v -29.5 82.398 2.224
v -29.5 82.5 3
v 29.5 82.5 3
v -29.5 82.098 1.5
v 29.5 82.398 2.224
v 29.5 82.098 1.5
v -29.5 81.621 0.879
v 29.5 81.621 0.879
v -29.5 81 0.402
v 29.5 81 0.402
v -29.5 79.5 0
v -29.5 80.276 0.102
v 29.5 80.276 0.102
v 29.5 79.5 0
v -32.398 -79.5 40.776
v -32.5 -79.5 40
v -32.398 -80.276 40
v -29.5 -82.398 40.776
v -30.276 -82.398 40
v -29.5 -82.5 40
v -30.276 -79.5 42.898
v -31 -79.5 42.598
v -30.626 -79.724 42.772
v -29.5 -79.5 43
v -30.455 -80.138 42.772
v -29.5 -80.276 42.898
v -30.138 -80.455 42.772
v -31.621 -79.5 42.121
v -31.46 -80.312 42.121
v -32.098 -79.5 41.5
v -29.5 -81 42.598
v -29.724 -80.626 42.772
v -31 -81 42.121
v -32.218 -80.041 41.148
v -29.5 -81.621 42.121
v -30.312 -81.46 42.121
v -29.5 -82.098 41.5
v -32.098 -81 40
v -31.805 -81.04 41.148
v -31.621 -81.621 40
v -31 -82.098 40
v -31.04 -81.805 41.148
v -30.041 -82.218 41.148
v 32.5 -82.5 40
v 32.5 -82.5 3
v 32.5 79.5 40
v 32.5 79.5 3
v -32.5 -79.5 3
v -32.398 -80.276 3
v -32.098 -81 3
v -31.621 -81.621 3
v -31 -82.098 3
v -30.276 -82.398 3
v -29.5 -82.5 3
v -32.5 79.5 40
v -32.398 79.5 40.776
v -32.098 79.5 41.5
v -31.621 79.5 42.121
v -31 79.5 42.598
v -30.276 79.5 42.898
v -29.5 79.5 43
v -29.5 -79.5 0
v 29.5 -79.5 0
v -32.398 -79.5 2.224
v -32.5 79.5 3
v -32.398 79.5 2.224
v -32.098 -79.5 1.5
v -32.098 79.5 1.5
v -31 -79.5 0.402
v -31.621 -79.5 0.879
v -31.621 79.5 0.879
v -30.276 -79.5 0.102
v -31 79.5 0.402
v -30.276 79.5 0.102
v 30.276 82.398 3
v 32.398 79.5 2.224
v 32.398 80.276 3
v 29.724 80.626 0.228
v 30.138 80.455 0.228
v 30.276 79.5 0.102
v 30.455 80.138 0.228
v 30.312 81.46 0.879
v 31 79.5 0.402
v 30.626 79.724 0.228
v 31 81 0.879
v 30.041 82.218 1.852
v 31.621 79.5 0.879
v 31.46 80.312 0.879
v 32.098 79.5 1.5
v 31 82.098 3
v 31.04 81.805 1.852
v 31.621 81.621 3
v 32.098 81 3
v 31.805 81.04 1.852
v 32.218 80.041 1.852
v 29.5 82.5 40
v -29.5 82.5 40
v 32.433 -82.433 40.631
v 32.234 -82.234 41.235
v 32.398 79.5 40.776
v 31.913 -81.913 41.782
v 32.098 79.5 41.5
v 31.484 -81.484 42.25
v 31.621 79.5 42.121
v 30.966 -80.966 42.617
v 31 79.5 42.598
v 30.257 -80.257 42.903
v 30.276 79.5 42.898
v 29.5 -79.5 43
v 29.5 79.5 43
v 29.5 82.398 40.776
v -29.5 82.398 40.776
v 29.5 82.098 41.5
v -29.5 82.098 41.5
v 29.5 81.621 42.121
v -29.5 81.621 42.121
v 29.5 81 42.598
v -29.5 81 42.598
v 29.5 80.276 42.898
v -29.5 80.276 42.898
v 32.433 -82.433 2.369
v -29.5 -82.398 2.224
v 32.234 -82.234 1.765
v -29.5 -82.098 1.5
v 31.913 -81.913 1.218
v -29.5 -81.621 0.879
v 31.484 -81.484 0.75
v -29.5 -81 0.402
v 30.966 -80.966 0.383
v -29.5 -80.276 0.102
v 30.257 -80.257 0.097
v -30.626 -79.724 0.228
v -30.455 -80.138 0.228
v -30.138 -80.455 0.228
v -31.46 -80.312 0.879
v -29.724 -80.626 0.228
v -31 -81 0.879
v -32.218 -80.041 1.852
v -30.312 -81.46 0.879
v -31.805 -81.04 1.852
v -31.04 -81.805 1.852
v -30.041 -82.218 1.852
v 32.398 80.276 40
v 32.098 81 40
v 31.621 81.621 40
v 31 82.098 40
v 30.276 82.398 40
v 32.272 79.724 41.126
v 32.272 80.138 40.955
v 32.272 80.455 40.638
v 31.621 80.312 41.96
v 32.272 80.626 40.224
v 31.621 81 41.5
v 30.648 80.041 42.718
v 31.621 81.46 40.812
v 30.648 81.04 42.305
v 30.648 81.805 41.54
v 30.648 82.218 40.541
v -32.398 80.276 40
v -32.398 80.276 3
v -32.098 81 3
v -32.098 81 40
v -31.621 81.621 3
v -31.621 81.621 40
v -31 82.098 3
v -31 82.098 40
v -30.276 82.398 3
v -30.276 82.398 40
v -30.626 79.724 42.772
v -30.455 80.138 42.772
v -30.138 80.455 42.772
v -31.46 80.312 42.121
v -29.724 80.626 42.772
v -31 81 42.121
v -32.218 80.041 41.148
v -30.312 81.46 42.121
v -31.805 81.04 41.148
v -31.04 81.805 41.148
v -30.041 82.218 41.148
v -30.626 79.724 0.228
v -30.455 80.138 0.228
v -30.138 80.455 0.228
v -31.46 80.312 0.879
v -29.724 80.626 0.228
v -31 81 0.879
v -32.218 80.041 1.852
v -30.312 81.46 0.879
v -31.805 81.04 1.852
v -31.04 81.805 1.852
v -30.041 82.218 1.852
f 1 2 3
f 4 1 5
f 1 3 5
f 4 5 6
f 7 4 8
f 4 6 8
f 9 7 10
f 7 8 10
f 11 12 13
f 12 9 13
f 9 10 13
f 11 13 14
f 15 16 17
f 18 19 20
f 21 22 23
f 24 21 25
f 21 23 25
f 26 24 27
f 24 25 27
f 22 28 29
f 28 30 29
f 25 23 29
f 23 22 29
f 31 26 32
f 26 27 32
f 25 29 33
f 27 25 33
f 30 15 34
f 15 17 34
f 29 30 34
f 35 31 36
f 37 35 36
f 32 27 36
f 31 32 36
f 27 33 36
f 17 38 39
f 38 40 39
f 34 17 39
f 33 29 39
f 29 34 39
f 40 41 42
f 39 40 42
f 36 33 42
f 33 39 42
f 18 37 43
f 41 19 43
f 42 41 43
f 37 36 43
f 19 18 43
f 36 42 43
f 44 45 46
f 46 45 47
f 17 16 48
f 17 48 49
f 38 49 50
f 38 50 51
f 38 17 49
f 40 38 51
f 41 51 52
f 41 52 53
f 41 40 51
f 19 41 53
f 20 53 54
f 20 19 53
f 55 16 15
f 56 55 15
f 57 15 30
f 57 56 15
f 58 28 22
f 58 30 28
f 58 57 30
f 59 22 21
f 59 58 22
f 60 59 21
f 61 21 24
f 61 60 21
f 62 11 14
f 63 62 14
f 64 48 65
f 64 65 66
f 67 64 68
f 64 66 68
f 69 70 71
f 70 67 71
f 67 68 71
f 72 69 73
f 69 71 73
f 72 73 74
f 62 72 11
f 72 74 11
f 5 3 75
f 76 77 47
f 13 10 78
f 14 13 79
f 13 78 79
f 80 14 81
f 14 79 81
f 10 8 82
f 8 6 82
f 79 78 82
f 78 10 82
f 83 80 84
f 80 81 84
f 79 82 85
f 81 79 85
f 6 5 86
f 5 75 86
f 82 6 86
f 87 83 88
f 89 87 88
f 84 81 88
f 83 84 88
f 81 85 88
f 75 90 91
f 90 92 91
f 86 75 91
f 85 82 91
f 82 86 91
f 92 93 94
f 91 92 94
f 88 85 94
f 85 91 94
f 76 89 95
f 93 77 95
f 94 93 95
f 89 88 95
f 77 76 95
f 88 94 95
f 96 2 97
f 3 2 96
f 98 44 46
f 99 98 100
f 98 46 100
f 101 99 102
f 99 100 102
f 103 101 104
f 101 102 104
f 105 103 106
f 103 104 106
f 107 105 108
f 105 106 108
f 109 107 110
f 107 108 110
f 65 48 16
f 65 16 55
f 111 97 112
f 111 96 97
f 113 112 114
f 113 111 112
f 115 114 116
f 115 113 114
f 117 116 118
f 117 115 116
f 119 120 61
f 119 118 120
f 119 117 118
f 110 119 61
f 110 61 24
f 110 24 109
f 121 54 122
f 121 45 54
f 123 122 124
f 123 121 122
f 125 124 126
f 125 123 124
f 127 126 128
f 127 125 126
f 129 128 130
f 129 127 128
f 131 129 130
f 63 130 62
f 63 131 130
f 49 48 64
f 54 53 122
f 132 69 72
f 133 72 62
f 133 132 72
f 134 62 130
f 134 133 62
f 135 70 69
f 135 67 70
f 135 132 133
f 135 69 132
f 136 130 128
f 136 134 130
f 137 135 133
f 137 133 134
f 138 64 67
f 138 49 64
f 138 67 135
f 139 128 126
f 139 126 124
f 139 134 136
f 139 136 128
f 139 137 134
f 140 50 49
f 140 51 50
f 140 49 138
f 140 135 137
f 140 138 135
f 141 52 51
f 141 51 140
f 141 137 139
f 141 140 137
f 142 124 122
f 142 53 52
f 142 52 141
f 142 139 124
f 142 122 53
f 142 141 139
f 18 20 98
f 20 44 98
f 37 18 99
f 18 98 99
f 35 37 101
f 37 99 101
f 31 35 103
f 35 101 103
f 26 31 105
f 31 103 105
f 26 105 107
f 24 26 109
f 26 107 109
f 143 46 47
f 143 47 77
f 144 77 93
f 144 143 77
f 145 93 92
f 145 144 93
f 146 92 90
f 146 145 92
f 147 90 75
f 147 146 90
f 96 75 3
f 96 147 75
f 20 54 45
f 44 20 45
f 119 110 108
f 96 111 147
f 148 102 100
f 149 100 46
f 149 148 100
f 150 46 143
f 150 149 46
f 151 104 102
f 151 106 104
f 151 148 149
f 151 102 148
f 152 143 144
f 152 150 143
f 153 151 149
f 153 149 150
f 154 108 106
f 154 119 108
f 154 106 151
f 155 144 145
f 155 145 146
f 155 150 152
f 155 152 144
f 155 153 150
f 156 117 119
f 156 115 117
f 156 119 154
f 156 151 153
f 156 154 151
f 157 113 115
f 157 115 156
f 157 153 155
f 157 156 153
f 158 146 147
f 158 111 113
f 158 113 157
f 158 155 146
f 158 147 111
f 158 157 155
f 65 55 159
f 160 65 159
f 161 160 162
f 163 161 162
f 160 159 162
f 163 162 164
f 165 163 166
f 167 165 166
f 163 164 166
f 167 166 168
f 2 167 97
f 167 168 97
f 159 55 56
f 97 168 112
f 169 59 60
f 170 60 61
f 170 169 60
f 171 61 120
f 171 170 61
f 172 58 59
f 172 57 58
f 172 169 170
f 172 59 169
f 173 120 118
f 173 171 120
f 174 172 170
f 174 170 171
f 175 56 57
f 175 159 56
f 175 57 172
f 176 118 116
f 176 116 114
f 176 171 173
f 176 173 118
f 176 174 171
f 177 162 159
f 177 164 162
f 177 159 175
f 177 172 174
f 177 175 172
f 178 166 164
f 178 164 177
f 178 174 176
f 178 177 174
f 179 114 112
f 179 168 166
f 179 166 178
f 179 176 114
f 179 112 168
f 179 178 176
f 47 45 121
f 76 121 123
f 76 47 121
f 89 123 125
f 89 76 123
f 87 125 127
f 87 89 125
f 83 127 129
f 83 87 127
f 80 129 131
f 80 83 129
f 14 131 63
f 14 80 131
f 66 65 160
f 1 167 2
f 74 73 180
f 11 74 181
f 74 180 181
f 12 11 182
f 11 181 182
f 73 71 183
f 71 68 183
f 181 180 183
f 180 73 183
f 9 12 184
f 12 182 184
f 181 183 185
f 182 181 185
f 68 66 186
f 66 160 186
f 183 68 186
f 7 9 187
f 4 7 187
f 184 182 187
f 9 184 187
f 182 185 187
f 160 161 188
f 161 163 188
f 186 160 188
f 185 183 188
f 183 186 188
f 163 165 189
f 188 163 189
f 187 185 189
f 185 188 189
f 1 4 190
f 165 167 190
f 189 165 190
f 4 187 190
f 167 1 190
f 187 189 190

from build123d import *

# Parameters (mm, degrees)
F0_W     = 65
F0_H     = 165
F1_DEPTH = 43
F2_R     = 3


with BuildPart() as f1:
    # F0 (on Top) → F1 (new body)
    with BuildSketch(Plane.XY):
        Rectangle(F0_W, F0_H)
    extrude(amount=F1_DEPTH)

    # F2
    f2_edges = [f1.edges().sort_by_distance(p)[0] for p in [
        (-32.5, 82.5, 21.5),
        (-32.5, -82.5, 21.5),
        (-32.5, 0, 0),
        (-32.5, 0, 43),
        (0, 82.5, 43),
        (0, -82.5, 43),
        (32.5, 0, 43),
        (32.5, 82.5, 21.5),
        (0, 82.5, 0),
        (0, -82.5, 0),
        (32.5, 0, 0),
    ]]
    fillet(f2_edges, radius=F2_R)


solid = f1.part
